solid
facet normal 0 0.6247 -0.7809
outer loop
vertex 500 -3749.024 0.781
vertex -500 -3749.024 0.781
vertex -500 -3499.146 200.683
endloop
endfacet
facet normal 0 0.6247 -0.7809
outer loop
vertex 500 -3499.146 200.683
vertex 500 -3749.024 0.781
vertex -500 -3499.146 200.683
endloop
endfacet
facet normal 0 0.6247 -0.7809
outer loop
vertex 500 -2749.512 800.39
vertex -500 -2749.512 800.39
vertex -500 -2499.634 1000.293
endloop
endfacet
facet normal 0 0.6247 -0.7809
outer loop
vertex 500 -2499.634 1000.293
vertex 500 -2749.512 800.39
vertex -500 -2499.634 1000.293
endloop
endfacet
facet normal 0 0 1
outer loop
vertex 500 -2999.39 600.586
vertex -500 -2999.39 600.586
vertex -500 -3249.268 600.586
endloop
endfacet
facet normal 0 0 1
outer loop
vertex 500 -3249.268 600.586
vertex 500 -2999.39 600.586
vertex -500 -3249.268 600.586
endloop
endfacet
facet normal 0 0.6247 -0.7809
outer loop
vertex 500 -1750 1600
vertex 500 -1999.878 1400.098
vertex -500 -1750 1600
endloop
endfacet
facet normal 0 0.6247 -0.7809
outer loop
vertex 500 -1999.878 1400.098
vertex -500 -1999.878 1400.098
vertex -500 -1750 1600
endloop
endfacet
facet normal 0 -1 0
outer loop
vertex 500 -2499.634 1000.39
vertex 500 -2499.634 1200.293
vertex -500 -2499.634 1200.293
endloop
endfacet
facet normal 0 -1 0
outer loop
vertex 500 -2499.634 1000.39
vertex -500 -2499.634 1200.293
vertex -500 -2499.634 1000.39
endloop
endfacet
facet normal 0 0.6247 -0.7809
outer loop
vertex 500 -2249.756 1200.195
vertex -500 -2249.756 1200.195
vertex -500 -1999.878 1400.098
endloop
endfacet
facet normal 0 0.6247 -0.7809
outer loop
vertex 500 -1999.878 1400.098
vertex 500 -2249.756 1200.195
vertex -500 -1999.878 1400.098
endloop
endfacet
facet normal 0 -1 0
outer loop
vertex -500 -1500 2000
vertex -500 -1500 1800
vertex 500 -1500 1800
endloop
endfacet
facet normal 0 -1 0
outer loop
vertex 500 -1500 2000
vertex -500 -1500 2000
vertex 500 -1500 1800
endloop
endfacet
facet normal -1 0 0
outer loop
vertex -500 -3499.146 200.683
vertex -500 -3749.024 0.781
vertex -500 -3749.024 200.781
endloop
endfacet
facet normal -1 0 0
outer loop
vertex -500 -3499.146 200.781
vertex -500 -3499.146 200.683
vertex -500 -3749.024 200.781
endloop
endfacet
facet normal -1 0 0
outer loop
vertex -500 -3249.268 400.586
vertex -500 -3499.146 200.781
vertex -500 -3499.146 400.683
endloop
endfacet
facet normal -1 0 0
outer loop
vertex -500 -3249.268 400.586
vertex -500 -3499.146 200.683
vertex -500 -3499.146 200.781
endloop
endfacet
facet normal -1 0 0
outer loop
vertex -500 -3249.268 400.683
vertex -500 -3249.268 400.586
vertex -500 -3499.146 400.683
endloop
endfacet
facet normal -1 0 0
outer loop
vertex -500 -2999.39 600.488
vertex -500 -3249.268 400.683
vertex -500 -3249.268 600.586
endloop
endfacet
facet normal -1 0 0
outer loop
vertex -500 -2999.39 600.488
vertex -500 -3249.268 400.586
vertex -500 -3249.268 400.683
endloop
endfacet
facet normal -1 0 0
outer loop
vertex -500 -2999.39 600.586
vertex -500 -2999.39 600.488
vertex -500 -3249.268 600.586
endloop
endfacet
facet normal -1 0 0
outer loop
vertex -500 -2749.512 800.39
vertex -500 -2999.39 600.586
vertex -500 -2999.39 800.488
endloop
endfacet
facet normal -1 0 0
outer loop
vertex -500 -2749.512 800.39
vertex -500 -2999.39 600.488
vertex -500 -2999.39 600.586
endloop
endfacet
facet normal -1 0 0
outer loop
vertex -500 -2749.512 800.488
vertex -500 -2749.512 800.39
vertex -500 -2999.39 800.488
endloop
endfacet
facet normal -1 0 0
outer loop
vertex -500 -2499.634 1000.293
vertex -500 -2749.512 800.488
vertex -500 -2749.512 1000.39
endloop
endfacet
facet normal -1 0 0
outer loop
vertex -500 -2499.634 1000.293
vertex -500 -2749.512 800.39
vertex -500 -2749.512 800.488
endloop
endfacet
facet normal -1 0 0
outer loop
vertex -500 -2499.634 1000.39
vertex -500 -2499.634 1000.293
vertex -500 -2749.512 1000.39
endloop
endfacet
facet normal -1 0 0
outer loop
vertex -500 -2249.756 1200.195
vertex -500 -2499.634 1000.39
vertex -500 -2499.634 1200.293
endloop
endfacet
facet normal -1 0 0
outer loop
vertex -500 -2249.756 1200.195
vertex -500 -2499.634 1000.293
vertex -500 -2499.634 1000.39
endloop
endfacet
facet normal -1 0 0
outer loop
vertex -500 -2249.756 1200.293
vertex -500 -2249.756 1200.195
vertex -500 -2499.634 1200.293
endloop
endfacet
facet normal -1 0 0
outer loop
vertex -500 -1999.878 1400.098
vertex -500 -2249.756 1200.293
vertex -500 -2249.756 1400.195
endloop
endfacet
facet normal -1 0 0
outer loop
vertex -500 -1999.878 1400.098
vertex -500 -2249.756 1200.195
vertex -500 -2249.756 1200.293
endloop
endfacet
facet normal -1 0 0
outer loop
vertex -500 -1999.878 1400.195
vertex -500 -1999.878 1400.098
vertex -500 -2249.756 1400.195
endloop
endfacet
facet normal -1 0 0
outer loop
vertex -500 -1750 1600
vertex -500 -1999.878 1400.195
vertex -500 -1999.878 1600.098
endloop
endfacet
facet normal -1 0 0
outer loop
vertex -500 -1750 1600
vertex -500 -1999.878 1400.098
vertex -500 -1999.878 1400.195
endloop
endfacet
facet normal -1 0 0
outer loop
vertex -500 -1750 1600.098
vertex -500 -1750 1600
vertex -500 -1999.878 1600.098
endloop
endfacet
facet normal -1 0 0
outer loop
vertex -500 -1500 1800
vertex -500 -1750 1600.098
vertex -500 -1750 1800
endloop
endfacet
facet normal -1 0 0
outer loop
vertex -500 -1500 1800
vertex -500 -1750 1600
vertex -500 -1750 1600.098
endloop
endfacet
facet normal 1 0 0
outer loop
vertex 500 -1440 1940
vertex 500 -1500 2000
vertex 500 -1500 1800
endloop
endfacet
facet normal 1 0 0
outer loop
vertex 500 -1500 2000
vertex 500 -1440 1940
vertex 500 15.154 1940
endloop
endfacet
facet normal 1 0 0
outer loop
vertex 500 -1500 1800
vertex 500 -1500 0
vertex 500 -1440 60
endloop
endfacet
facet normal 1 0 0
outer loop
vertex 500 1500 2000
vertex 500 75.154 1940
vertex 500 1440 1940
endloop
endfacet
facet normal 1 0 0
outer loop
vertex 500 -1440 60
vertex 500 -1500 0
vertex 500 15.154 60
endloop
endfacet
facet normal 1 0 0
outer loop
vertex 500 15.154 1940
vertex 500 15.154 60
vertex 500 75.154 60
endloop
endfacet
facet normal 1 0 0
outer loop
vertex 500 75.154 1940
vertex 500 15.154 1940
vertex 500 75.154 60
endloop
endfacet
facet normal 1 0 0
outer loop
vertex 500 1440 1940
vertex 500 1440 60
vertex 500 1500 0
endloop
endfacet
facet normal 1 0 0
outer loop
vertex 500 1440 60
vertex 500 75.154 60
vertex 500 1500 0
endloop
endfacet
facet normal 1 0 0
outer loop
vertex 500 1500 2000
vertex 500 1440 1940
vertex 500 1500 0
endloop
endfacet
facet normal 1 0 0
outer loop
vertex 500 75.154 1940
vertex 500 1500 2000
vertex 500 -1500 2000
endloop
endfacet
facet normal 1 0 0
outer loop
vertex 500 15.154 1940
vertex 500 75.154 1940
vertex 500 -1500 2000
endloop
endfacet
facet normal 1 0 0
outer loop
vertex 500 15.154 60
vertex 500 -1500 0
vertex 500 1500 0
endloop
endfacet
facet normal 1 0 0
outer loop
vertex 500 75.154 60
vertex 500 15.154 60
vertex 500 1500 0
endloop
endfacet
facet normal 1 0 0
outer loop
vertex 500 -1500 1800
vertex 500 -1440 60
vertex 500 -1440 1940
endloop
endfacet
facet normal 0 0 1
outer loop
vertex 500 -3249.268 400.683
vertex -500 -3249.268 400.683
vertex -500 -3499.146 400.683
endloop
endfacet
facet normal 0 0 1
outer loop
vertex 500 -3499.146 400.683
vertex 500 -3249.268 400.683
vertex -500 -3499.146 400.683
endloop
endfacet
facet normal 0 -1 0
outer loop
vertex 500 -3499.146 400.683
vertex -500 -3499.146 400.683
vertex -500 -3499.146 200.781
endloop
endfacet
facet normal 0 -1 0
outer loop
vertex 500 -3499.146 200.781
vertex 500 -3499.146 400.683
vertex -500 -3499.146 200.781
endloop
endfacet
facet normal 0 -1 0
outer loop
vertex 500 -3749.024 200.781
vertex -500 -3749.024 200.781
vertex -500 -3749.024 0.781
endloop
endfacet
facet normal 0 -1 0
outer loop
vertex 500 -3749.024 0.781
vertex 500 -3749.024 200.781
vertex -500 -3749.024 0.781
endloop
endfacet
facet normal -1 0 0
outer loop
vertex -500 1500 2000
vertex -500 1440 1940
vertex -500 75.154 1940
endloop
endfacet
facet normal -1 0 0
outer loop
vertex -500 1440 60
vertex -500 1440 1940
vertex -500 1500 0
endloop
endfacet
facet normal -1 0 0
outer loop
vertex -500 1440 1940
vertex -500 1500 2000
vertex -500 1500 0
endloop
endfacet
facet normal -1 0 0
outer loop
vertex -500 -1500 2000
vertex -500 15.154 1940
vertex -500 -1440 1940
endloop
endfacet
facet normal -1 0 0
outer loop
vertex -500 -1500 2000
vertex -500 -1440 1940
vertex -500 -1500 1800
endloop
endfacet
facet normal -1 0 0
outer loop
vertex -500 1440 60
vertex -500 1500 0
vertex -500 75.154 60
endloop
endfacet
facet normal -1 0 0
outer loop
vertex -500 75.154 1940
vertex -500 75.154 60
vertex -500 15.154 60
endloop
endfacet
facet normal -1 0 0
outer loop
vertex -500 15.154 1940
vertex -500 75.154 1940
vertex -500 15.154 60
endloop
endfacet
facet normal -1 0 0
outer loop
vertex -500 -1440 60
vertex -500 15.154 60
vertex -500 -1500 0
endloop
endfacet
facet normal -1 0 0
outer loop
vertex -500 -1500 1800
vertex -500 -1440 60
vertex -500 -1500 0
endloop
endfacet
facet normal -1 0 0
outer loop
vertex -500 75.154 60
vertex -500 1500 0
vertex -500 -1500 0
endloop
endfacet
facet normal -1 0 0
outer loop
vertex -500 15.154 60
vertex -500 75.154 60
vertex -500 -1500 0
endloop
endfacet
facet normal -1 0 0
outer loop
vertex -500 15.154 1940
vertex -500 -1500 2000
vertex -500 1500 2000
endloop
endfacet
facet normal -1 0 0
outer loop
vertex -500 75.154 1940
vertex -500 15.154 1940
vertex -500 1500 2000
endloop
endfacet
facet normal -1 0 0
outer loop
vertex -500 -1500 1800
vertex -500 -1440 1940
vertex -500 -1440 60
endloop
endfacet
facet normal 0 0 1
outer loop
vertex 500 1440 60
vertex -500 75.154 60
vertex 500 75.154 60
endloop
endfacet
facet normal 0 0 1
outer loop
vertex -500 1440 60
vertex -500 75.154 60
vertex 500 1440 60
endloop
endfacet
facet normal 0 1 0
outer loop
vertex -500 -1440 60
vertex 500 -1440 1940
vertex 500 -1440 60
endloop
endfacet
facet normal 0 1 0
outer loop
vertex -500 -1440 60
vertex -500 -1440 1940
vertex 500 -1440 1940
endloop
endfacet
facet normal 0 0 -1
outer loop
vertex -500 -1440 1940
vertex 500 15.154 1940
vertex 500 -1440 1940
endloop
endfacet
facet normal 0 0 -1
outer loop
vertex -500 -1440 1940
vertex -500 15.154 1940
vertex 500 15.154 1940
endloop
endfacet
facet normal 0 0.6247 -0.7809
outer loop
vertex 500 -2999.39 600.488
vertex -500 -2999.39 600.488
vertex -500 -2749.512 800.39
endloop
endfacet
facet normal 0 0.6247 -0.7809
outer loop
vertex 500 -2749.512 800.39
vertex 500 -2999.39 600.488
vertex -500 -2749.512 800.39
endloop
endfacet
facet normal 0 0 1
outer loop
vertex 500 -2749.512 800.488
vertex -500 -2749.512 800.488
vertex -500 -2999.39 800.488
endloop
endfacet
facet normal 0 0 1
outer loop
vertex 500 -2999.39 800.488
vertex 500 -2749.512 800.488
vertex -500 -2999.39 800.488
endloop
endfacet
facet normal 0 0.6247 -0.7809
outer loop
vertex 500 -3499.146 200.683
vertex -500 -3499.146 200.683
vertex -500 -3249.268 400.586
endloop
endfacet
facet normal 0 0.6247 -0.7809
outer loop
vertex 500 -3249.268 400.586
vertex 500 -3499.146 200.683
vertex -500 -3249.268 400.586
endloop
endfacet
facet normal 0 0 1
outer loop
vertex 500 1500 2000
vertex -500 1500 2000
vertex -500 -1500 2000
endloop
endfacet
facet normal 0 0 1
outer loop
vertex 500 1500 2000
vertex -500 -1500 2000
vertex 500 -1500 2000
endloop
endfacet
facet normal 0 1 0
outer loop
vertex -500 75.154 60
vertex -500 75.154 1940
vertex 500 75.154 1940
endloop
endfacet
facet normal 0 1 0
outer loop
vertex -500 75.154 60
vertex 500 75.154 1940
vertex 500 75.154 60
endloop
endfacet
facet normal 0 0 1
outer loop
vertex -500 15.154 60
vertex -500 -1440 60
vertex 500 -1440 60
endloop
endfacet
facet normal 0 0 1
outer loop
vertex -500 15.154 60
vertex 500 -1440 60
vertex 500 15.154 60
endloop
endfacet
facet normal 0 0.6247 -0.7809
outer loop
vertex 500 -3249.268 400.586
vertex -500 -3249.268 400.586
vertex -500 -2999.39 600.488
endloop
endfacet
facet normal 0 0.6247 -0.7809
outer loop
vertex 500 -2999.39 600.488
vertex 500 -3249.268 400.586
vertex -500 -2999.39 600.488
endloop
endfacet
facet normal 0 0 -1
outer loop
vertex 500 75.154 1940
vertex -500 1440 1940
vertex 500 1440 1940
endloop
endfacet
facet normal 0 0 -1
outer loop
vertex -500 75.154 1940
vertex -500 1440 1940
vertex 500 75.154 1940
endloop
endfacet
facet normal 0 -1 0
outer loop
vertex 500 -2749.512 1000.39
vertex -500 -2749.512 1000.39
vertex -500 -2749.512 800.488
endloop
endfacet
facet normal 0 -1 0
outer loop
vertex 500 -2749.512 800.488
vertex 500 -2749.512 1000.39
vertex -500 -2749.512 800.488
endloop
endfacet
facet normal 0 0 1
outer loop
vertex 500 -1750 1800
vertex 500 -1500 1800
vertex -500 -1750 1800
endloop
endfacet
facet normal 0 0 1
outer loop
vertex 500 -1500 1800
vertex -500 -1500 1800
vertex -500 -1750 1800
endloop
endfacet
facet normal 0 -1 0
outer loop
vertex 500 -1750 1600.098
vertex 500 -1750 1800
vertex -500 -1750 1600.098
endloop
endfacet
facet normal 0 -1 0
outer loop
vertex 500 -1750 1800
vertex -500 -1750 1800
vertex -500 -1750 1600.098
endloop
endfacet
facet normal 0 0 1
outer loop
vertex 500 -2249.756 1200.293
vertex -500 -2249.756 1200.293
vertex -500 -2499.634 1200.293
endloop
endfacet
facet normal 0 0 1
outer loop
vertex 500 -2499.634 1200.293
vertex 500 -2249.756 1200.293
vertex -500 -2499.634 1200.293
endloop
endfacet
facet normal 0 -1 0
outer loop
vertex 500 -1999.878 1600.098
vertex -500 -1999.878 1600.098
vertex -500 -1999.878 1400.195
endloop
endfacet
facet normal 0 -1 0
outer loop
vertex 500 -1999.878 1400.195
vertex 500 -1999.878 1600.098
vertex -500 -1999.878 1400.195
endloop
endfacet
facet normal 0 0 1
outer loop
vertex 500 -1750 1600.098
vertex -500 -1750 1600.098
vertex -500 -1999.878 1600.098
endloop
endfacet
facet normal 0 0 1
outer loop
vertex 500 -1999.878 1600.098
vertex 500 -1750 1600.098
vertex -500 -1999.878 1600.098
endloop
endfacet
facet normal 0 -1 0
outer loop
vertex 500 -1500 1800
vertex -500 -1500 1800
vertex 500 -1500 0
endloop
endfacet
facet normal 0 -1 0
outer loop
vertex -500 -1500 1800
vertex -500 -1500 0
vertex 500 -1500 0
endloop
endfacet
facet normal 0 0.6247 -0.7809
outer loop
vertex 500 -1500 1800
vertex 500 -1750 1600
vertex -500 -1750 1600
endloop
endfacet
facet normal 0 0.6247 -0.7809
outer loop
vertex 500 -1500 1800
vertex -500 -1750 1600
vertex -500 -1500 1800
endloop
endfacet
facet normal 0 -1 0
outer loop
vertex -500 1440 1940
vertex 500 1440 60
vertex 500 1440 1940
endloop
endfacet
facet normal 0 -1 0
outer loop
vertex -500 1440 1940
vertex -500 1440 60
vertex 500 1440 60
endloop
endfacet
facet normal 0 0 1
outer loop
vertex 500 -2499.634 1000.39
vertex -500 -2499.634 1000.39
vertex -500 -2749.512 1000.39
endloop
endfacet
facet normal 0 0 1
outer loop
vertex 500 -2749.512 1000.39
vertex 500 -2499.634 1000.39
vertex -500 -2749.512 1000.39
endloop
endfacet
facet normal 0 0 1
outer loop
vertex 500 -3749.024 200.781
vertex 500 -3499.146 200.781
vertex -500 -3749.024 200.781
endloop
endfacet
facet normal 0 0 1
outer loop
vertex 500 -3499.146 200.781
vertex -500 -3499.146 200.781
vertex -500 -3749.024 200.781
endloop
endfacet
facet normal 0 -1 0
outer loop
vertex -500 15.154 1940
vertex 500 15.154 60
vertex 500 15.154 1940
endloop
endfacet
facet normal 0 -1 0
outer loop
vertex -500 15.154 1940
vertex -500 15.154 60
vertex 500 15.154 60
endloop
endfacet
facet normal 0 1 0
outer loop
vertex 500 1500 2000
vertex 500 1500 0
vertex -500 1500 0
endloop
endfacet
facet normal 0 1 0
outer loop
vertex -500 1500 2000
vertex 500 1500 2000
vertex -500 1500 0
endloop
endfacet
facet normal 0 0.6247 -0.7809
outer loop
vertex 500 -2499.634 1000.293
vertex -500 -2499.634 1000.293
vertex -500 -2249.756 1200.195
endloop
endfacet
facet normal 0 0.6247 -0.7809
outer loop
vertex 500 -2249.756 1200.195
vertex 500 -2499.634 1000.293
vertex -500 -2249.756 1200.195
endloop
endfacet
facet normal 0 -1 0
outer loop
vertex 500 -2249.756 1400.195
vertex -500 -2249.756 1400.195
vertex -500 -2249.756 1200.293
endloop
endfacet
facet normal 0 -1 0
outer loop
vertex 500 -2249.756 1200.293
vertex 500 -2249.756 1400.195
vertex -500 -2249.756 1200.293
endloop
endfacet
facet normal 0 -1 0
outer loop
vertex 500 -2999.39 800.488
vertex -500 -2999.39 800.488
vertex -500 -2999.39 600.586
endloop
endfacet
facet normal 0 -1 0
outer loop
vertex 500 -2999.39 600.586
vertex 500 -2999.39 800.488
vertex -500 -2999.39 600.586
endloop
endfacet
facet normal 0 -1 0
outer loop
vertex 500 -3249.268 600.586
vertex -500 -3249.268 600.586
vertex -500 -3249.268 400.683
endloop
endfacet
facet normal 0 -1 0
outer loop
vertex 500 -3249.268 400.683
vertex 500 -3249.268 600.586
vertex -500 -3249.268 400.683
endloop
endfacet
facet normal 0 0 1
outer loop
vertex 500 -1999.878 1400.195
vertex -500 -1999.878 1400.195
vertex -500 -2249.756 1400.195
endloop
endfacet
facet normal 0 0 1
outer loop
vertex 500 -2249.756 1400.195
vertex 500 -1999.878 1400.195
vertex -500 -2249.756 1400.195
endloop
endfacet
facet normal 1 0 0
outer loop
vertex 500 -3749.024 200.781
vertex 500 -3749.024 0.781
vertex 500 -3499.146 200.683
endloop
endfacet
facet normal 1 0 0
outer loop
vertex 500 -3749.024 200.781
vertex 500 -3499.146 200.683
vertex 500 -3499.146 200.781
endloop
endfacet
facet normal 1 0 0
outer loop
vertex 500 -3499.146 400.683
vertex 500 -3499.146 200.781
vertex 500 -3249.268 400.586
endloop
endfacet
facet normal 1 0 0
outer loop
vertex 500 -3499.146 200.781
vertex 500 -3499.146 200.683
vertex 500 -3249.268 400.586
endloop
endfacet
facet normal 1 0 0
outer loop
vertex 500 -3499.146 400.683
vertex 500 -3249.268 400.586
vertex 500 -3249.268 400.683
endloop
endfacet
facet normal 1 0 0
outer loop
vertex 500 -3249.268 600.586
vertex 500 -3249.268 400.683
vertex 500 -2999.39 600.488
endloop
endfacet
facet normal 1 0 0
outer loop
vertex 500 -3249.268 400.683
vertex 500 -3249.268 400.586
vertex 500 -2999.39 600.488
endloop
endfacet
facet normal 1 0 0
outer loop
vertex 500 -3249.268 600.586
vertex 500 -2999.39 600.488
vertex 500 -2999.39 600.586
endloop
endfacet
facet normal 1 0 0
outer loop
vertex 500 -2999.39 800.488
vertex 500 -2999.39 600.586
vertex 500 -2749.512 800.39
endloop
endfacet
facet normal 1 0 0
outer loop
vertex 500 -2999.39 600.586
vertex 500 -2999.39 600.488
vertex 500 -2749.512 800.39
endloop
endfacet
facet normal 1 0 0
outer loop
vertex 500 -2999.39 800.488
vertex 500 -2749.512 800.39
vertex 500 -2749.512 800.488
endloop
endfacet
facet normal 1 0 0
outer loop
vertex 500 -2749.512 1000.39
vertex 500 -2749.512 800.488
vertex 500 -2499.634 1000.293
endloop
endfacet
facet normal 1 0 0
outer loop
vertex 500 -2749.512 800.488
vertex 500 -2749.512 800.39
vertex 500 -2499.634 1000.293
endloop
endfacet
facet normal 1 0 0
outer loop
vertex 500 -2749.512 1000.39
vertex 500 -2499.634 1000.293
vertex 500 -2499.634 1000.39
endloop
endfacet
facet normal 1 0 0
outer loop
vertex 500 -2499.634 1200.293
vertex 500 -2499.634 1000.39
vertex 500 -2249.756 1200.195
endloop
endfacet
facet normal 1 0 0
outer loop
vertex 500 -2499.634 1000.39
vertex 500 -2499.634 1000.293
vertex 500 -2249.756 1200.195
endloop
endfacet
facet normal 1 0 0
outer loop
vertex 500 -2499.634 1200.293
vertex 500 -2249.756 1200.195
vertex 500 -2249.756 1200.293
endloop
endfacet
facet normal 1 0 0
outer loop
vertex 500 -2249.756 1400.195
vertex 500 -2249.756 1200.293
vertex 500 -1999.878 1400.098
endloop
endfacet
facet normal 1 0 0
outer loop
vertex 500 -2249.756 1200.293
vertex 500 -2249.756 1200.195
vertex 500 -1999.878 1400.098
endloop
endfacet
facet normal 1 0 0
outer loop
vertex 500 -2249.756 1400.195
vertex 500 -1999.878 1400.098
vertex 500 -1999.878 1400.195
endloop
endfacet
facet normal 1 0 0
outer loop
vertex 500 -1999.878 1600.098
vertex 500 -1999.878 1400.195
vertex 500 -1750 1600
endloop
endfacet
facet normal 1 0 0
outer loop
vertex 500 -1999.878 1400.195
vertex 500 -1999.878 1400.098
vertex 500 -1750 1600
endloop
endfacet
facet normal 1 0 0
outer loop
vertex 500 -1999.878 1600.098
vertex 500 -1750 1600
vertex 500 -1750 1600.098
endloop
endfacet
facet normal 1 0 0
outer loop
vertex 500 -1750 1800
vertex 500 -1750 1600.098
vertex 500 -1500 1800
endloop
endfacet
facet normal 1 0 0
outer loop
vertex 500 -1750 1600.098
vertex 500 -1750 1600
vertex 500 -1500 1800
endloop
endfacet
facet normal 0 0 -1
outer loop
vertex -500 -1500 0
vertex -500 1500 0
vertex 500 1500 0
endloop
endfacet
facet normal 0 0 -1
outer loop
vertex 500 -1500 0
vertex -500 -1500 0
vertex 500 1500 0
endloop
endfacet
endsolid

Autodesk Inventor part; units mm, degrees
ref_plane "YZ Plane" through (0, 0, 0) normal (1, 0, 0) x (0, 1, 0)
ref_plane "XZ Plane" through (0, 0, 0) normal (0, 1, 0) x (-1, 0, 0)
ref_plane "XY Plane" through (0, 0, 0) normal (0, 0, 1) x (1, 0, 0)
sketch "Sketch1" plane through (0, 0, 0) normal (0, 0, 1) x (1, 0, 0)
  line L0 (500, 1500) -> (-500, 1500)
  line L1 (-500, 1500) -> (-500, -1500)
  line L2 (-500, -1500) -> (500, -1500)
  line L3 (500, -1500) -> (500, 1500)
  line L4 (500, 1500) -> (-500, -1500) construction
  line L5 (-500, 1500) -> (500, -1500) construction
  point P0 (0, 0)
  dimension "d0" = 1000
  dimension "d1" = 3000
extrude "Extrusion1" add sketch "Sketch1" along normal blind 2000
sketch "Sketch2" plane through (-500, -1500, 0) normal (-1, 0, 0) x (0, 0, 1)
  line L0 (0, 3000) -> (0, 0) projected
  line L1 (0, 0) -> (2000, 0) projected
  line L2 (2000, 3000) -> (2000, 0) projected
  line L3 (0, 3000) -> (2000, 3000) projected
  line L4 (1800, 0) -> (1800, -250)
  line L5 (1800, -250) -> (1600, -250)
  line L6 (1600, -250) -> (1800, 0)
  point P0 (0, 1500)
  dimension "d4" = 250
  dimension "d5" = 200
  dimension "d6" = 200
  dimension "d7" = 51.34
extrude "Extrusion2" add sketch "Sketch2" against normal up to surface (1000 mm away) contours L4 L5 L6
pattern_linear "Rectangular Pattern1" count 9 spacing 320 along (0, -0.7808688, -0.624695) of "Extrusion2"
sketch "Sketch3" plane through (-500, -1500, 0) normal (-1, 0, 0) x (0, 0, 1)
  line L0 (0, 3000) -> (0, 0) projected
  line L1 (0, 0) -> (1800, 0) projected
  line L2 (1800, 0) -> (2000, 0) projected
  line L3 (2000, 3000) -> (2000, 0) projected
  line L4 (0, 3000) -> (2000, 3000) projected
  line L5 (1940, 60) -> (1800, 60)
  line L6 (1800, 60) -> (60, 60)
  line L7 (60, 60) -> (60, 2940)
  line L8 (60, 2940) -> (1940, 2940)
  line L9 (1940, 2940) -> (1940, 60)
  line L10 (1940, 1575.1535) -> (60, 1575.1535)
  line L11 (60, 1575.1535) -> (60, 1515.1535)
  line L12 (60, 1515.1535) -> (1940, 1515.1535)
  line L13 (1940, 1515.1535) -> (1940, 1575.1535)
  point P0 (0, 1500)
  dimension "d13" = 60
  dimension "d14" = 60
extrude "Extrusion3" cut sketch "Sketch3" against normal through all contours L5 L6 L7 L12 L9 | L10 L7 L8 L9
equation "\"d6\" = d5"
equation "\"d14\" = d13"
properties part number "BSH 03 upstairs"
